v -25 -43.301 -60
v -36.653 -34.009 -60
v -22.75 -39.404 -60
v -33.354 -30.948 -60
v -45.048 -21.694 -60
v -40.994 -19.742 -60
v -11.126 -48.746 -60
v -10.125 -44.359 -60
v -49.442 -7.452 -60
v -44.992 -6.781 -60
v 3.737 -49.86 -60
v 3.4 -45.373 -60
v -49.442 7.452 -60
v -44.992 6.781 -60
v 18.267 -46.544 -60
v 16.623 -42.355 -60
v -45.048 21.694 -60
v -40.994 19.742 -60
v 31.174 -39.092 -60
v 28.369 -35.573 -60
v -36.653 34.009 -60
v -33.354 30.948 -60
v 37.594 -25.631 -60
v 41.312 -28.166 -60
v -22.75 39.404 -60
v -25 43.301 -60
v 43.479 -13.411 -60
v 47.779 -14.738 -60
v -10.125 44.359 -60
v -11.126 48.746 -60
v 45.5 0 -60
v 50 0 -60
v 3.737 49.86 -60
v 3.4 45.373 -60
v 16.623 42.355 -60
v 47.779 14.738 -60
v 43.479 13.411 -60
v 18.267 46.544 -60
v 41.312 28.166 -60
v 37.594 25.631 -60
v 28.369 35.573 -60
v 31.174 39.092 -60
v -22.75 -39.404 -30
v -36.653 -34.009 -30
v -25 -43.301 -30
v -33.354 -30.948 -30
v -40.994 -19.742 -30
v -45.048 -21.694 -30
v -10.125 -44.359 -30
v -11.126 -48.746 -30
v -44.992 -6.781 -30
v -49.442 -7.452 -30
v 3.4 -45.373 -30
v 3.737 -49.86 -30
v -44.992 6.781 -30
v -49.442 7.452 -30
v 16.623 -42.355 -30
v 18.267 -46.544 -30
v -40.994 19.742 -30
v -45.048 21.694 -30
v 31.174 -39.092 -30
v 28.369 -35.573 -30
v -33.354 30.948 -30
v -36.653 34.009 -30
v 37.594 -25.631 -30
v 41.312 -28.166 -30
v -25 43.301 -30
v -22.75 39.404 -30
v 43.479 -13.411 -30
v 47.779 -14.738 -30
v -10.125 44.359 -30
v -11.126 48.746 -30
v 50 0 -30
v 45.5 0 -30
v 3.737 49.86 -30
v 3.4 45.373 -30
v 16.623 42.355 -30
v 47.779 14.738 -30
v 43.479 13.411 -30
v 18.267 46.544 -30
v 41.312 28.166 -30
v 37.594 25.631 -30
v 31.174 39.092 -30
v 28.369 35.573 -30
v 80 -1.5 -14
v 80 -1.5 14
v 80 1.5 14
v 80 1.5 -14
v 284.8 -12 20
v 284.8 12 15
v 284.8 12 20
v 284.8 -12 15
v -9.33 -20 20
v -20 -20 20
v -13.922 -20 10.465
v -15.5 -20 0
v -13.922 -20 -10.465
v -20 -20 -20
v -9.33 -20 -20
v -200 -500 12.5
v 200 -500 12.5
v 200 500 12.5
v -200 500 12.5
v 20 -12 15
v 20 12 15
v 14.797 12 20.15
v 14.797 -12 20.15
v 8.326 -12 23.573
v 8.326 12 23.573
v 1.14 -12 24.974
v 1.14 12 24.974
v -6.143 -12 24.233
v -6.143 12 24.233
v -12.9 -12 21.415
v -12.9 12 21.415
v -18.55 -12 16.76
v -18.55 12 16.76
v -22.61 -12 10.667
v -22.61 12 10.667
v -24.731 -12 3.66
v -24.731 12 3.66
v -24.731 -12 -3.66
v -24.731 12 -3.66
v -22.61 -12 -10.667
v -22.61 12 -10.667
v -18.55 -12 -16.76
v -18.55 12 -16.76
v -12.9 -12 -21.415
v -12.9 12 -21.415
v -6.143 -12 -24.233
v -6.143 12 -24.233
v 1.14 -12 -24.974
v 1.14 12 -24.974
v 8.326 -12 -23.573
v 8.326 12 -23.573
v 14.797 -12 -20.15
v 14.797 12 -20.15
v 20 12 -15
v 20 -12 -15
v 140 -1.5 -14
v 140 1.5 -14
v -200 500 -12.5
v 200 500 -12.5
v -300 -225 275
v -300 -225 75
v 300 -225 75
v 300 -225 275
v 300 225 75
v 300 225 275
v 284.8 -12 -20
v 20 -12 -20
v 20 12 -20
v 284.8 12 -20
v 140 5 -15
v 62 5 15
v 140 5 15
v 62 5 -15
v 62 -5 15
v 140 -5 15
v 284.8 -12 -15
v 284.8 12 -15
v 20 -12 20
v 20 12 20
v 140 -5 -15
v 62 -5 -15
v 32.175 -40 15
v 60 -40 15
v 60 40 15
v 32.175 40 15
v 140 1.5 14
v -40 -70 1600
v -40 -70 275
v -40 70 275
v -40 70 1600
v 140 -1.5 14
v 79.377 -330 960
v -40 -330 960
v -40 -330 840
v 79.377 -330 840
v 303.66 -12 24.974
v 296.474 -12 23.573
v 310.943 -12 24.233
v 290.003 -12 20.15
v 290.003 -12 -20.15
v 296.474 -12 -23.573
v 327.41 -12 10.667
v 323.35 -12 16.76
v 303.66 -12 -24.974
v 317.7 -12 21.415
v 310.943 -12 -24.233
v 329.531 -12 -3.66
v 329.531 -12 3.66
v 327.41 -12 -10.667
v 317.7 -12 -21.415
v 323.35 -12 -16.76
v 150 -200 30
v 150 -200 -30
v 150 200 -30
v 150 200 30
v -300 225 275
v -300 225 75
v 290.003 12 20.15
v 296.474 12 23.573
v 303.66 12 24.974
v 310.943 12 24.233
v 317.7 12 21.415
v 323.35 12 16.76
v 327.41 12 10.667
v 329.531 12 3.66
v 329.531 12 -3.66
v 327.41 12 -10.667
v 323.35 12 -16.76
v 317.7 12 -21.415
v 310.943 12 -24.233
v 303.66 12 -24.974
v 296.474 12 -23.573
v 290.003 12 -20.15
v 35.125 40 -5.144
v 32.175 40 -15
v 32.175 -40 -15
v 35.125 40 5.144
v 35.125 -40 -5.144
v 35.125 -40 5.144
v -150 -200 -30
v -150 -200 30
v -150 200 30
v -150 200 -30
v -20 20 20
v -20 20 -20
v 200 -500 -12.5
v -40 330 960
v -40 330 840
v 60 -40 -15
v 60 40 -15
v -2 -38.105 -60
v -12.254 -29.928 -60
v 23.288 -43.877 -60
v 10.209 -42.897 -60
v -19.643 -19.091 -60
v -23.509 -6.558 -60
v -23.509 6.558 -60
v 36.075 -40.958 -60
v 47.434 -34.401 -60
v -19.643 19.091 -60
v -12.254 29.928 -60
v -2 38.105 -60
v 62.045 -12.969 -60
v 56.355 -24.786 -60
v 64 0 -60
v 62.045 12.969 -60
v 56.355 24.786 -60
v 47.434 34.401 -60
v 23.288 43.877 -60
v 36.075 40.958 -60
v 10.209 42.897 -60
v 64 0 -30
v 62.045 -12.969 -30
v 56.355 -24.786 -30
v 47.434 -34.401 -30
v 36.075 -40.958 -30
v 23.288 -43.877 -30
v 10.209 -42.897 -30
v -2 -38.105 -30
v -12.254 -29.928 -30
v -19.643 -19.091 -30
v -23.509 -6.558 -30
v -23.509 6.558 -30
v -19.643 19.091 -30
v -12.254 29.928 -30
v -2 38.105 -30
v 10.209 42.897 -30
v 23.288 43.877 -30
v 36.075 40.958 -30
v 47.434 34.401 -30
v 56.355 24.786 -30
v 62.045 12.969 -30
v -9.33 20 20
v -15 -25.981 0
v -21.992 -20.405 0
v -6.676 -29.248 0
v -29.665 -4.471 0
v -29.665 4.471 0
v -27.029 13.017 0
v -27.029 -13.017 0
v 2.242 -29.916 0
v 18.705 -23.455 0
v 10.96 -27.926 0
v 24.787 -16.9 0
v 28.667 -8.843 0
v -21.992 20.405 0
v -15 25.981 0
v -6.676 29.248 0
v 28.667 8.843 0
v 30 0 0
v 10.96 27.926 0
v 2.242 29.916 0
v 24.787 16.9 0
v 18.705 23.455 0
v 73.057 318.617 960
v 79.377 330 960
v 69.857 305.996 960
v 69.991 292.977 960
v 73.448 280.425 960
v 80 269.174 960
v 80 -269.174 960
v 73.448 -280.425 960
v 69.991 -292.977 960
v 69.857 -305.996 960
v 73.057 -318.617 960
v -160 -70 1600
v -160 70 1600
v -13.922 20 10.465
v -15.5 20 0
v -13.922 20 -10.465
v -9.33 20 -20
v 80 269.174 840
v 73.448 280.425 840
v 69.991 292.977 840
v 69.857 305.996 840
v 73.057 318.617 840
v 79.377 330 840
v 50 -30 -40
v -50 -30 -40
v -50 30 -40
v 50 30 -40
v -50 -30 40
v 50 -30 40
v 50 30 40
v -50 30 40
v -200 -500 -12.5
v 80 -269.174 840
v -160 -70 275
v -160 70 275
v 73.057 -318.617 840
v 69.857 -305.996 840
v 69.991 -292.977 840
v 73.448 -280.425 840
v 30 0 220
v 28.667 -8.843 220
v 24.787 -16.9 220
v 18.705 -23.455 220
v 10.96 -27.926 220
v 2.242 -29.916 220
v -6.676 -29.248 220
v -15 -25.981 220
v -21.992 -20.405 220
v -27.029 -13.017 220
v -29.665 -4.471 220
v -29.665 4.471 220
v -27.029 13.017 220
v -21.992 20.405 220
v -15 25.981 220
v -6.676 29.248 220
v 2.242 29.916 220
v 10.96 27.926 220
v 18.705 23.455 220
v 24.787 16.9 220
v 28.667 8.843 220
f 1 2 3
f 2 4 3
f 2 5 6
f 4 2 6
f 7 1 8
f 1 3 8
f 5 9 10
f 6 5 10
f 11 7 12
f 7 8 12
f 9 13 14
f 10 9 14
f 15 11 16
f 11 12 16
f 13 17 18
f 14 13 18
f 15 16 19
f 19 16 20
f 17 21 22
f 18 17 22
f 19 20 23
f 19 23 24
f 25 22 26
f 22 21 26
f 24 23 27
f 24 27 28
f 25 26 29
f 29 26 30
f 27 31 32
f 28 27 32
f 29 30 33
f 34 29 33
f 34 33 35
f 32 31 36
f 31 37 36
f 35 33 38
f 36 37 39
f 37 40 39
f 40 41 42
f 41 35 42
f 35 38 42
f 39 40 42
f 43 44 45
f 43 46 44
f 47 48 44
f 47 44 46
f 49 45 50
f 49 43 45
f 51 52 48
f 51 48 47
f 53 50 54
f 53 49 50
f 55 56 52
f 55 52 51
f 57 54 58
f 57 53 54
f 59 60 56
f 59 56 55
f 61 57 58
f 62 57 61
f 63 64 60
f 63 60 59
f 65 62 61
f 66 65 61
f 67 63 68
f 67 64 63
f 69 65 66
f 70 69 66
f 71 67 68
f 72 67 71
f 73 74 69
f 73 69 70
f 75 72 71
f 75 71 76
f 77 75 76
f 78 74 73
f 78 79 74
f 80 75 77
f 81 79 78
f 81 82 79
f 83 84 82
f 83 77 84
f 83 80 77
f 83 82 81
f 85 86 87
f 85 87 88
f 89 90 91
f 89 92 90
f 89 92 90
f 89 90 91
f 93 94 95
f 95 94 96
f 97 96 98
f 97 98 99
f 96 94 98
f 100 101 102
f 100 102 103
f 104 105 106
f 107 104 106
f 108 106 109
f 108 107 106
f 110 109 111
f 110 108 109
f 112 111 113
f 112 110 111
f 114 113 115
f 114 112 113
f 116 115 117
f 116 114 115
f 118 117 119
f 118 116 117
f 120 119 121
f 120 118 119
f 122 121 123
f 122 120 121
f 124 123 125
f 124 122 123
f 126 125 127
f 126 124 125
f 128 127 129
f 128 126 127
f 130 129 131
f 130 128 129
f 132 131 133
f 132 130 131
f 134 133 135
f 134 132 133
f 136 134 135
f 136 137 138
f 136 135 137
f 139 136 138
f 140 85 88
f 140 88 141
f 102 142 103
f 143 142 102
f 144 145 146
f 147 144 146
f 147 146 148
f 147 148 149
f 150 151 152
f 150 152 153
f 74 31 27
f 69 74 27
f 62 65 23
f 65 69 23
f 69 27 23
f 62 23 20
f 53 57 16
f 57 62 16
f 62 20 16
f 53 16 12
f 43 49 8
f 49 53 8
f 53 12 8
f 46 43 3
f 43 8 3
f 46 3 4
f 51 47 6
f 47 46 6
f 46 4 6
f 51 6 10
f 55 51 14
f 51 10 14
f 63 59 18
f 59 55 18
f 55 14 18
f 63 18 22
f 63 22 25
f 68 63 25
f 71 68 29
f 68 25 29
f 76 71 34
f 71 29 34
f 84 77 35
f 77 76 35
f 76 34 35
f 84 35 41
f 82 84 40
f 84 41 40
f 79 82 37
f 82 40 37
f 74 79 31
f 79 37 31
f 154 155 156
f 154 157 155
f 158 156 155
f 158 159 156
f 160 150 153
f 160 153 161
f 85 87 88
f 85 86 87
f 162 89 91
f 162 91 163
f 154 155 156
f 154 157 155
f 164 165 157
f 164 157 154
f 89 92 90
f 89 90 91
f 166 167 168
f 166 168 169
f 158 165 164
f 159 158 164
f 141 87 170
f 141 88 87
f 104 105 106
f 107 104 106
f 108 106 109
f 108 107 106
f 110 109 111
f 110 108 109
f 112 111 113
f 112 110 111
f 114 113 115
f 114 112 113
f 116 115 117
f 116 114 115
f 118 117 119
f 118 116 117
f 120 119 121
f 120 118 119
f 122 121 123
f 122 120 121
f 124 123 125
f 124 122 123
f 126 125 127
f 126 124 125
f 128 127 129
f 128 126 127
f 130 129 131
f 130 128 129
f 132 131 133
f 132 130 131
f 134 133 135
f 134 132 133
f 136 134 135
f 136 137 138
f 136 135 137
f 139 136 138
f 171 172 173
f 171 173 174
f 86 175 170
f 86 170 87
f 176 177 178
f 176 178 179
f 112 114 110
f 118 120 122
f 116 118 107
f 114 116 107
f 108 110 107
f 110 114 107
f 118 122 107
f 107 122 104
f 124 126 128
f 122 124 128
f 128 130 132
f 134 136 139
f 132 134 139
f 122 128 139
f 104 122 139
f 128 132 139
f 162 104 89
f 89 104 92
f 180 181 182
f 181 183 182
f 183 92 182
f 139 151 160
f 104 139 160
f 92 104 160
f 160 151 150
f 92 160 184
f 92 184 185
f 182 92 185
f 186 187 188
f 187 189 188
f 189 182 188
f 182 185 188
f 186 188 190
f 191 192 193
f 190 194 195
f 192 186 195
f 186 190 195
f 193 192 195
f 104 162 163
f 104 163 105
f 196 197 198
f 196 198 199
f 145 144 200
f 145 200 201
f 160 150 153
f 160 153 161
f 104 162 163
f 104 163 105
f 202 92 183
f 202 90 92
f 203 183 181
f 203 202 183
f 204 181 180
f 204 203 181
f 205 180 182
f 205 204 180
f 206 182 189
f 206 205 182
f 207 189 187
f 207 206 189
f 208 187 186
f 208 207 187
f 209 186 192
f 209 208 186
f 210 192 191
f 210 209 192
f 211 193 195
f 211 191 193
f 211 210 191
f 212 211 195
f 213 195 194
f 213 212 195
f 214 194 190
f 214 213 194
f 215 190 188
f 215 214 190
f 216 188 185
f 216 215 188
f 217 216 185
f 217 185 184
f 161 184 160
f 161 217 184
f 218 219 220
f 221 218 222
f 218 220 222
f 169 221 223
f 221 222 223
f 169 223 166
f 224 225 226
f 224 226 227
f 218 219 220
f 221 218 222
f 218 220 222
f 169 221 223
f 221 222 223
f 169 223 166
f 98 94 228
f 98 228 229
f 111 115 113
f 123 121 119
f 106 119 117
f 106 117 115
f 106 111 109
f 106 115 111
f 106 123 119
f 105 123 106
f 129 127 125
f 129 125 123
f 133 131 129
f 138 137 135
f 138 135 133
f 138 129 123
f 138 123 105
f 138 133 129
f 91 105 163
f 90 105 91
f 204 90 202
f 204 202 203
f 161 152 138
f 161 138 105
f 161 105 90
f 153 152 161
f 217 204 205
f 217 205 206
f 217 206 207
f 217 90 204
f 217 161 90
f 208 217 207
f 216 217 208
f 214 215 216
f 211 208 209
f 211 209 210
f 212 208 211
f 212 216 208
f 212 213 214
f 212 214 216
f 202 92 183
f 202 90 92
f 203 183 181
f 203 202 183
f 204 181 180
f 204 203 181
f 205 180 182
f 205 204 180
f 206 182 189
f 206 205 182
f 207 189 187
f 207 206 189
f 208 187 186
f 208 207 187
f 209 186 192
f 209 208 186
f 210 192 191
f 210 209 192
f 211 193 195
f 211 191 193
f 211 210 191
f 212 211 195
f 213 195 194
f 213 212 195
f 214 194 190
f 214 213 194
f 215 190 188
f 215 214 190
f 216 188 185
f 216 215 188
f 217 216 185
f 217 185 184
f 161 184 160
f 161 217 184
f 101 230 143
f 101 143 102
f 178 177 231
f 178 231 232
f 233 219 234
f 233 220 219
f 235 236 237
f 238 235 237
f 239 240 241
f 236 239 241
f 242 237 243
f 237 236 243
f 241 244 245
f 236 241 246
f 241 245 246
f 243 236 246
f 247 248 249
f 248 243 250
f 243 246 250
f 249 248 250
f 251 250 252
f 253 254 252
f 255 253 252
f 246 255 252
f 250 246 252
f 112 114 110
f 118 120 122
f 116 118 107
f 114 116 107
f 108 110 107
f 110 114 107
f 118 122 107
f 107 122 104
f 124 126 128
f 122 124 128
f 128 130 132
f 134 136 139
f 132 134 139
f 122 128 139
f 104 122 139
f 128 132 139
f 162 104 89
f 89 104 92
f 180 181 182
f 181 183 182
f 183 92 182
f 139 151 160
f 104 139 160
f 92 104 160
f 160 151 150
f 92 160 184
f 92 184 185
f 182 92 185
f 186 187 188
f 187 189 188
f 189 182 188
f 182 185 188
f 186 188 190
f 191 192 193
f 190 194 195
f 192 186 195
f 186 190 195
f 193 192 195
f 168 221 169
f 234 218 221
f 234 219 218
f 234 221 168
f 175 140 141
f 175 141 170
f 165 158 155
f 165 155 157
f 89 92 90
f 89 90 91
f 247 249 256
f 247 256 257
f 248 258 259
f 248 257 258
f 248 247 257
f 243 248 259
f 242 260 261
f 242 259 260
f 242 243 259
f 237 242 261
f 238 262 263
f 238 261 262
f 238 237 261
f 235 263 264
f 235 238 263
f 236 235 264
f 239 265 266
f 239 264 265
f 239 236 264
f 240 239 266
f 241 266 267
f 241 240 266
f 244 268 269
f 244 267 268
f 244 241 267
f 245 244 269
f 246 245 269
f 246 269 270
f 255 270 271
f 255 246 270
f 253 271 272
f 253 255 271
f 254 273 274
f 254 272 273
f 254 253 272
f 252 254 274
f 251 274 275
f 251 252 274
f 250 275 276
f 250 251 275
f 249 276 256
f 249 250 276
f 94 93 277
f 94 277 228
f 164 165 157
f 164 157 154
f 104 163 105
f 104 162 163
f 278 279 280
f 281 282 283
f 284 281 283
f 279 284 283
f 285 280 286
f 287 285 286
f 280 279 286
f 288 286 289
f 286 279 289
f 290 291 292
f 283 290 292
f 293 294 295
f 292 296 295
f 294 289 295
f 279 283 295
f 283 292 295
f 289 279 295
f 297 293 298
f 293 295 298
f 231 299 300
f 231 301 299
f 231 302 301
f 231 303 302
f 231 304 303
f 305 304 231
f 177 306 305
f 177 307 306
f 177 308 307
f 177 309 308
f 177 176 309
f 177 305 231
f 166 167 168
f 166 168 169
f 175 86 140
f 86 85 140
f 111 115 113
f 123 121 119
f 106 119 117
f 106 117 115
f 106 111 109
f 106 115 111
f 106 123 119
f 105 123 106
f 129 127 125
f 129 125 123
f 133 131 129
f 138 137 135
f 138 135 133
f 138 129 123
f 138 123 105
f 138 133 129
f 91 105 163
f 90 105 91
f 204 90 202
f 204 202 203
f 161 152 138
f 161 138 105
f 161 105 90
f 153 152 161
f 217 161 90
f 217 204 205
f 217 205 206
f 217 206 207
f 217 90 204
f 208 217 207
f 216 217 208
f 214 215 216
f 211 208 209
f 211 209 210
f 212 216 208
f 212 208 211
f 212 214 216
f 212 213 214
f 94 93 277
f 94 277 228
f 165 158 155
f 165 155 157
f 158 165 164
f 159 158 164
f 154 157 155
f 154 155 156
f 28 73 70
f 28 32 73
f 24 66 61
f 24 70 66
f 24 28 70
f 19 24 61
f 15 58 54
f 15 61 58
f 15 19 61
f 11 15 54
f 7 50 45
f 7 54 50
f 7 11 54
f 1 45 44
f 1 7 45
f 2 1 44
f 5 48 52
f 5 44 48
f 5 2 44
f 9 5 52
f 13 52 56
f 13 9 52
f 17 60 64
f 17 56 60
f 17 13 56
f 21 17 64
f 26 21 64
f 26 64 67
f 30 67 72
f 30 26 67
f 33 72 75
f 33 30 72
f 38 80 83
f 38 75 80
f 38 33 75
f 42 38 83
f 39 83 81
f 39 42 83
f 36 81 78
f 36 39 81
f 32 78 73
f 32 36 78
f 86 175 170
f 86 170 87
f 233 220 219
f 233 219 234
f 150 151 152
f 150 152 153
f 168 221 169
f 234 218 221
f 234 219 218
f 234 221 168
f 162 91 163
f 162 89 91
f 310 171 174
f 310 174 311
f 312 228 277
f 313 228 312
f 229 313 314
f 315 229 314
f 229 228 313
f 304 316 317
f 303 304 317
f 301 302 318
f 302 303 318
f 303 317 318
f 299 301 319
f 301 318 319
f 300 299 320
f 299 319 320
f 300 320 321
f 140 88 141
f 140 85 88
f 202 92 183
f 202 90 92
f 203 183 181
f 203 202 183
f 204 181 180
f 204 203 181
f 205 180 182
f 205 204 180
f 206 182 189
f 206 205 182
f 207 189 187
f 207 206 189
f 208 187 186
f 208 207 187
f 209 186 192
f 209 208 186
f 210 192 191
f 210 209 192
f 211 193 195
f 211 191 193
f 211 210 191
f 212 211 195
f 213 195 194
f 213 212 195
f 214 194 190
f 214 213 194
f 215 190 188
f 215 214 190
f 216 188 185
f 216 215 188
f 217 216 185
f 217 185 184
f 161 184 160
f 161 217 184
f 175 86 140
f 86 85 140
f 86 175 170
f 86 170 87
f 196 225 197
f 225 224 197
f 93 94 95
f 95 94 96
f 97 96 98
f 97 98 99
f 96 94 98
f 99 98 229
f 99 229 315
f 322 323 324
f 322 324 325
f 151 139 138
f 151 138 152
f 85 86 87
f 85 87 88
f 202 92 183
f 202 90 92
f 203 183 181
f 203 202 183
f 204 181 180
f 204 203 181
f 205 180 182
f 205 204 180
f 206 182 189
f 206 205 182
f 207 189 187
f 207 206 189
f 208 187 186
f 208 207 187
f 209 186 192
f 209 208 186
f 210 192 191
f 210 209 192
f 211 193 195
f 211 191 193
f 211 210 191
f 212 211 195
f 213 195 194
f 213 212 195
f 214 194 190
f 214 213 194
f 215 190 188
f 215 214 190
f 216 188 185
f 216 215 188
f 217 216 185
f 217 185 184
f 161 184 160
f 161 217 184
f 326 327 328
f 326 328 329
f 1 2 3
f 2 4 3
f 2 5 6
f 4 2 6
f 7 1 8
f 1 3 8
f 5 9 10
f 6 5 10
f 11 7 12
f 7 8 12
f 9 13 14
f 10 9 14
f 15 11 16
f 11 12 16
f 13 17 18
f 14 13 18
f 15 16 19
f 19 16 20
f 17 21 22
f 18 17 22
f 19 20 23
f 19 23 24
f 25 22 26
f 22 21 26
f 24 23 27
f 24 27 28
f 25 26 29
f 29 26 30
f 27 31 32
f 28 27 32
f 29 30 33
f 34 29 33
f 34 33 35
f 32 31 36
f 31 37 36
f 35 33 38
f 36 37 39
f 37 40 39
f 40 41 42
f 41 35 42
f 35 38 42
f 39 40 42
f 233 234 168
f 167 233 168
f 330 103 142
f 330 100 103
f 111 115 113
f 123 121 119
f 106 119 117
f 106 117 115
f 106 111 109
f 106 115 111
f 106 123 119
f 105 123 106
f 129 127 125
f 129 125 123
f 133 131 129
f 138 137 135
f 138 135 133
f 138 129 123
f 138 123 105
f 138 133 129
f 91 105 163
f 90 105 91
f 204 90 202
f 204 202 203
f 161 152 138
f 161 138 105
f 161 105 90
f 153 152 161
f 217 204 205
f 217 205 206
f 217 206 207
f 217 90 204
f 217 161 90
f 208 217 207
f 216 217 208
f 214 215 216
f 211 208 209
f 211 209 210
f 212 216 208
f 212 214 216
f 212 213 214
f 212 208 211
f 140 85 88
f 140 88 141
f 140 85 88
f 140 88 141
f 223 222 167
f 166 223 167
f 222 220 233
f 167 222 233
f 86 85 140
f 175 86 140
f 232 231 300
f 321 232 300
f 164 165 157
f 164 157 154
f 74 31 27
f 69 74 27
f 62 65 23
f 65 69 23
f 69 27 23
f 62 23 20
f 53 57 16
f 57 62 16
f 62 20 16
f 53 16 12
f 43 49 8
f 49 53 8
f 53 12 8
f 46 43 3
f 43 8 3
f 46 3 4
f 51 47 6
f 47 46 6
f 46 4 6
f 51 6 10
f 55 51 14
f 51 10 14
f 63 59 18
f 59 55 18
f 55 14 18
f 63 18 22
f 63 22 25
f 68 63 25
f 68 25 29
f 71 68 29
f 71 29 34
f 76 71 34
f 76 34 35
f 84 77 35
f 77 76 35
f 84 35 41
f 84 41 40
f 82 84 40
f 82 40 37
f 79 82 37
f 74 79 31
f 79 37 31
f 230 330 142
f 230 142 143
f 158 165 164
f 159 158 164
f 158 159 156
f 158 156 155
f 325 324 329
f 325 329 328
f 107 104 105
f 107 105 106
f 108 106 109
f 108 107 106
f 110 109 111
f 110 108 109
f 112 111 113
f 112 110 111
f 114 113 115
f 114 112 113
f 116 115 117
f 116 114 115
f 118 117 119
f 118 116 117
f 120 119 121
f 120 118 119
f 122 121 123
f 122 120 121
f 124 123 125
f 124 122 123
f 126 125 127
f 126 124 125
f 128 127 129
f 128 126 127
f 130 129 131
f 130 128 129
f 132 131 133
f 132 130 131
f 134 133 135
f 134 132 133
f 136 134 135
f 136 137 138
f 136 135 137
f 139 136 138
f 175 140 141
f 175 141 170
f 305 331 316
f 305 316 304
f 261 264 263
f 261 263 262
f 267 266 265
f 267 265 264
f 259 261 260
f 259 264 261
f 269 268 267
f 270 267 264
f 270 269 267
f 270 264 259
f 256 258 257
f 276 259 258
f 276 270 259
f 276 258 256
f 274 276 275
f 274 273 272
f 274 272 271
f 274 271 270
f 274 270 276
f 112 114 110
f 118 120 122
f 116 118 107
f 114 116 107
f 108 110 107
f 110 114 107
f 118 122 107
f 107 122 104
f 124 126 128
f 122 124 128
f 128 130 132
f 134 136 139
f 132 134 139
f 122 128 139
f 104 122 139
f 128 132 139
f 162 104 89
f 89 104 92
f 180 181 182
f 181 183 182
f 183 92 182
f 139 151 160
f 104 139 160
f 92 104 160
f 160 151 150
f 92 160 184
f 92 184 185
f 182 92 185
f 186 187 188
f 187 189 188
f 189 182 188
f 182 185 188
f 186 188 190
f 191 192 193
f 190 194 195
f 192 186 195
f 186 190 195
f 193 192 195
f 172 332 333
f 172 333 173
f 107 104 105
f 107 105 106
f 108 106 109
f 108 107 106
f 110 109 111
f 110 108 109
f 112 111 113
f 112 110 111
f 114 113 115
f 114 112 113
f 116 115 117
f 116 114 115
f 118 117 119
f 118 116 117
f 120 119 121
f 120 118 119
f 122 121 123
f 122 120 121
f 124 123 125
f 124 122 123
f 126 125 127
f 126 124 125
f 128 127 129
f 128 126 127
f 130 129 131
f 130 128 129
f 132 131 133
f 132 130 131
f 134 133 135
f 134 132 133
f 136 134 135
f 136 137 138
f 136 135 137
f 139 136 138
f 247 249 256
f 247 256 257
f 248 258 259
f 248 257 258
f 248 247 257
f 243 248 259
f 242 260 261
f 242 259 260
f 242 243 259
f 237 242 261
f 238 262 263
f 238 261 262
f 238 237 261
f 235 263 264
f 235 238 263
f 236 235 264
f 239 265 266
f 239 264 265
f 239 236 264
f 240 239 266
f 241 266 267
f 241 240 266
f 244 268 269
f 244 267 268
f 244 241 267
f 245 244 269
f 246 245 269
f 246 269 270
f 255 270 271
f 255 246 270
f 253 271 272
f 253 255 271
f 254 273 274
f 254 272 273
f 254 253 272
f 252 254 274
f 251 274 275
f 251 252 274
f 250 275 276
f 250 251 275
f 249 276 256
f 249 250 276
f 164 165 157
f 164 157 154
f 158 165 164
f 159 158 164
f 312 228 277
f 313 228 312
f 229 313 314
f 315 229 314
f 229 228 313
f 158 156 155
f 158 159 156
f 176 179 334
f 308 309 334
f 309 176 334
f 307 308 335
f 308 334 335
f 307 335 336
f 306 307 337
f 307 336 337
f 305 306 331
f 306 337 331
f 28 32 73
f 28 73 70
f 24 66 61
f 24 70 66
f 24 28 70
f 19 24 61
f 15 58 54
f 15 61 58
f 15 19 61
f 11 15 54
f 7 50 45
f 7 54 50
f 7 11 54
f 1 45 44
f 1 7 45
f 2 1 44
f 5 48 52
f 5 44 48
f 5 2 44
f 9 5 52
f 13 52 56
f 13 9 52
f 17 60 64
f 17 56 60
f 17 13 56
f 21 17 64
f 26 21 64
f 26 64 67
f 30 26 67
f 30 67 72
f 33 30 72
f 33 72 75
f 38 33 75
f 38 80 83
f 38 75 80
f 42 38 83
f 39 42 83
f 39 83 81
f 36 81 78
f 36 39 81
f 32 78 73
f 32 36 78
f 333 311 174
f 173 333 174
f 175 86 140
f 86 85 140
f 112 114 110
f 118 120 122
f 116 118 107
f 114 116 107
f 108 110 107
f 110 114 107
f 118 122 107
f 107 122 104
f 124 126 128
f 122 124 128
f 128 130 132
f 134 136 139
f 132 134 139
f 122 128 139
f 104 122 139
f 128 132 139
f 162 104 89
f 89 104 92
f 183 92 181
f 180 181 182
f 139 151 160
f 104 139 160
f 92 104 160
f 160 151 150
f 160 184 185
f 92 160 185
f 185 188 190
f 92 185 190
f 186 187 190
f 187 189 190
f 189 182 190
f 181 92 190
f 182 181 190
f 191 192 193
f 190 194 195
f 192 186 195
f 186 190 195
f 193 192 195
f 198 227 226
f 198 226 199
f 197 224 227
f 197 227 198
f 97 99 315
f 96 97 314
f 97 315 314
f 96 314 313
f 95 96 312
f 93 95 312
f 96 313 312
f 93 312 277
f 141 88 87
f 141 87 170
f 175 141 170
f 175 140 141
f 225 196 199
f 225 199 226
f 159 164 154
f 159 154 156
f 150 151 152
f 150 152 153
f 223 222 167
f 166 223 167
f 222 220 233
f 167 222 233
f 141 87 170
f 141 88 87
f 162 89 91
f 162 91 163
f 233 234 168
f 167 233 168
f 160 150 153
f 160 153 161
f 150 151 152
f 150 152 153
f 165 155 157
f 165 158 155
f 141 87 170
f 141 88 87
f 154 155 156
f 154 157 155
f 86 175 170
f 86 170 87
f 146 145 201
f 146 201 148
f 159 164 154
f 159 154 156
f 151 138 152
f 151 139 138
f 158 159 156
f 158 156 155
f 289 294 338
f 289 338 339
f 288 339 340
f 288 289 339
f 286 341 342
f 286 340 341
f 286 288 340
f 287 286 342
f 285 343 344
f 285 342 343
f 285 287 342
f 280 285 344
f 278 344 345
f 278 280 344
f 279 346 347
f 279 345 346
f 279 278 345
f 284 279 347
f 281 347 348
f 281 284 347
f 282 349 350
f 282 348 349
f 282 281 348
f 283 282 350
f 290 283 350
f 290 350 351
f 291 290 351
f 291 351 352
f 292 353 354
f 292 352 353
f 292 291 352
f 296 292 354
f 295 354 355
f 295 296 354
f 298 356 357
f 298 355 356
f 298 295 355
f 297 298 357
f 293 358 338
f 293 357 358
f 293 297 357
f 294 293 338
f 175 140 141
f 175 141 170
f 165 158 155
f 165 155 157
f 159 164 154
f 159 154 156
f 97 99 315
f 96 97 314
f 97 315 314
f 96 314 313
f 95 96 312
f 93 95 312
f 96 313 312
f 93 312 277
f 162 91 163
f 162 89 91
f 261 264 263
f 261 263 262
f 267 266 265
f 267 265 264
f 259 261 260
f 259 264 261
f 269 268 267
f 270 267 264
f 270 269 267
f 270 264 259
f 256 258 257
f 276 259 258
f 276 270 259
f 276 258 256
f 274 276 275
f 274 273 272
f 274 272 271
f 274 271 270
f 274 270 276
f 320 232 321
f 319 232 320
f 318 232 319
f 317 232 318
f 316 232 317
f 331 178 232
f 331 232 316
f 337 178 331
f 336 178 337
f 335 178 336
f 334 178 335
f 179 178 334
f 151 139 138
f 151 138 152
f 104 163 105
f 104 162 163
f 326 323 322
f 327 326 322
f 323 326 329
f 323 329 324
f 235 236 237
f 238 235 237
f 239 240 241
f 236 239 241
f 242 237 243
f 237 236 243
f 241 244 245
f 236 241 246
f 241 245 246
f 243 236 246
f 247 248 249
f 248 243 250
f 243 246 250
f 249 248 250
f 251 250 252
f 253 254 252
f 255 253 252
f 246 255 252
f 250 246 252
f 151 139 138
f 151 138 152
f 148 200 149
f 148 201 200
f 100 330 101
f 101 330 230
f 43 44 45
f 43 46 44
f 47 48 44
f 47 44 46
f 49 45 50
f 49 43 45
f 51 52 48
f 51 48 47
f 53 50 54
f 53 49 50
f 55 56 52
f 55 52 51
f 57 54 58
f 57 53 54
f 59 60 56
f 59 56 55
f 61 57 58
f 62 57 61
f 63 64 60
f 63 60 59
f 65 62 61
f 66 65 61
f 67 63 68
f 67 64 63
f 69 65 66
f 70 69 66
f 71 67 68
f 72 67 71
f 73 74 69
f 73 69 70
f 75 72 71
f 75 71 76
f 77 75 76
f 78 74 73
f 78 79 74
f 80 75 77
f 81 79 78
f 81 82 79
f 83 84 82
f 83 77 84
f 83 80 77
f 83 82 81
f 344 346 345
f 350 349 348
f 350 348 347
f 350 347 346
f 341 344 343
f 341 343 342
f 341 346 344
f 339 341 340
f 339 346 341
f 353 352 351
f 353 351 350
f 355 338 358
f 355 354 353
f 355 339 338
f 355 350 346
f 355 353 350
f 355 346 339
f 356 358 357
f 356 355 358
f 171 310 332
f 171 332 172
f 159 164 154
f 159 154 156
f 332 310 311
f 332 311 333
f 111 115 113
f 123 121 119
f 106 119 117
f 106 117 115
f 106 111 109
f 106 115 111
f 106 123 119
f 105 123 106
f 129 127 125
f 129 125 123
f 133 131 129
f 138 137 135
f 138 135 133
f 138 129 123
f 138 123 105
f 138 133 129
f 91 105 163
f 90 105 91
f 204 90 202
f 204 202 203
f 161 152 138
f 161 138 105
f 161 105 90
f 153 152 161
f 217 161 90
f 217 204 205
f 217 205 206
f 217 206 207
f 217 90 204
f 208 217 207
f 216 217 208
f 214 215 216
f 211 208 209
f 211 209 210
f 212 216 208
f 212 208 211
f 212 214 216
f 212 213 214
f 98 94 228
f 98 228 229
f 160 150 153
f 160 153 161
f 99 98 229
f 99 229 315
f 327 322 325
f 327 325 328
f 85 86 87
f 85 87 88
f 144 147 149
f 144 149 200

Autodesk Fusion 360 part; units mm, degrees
sketch "Layout_Side" plane through (0, 0, 0) normal (0, 1, 0) x (1, 0, 0) in component "00_Layout"
  line L0 (0, 0) -> (0, -1676.4) construction
  line L1 (300, -275) -> (-300, -275) construction
  line L2 (-300, -275) -> (-300, -75) construction
  line L3 (-300, -75) -> (300, -75) construction
  line L4 (300, -75) -> (300, -275) construction
  line L5 (300, -275) -> (-300, -75) construction
  line L6 (-300, -275) -> (300, -75) construction
  line L7 (0, -1676.4) -> (600, -1676.4) construction
  line L8 (0, -175) -> (0, -75) construction
  dimension "d1" = 200
  dimension "d2" = 600
  dimension "d4" = 600
  dimension "d5" = 75
  dimension "d6" = 1676.4
sketch "Base_Profile" plane through (0, 0, 0) normal (0, 1, 0) x (1, 0, 0) in component "01_Base_Envelope"
  line L0 (300, -275) -> (-300, -275)
  line L1 (-300, -275) -> (-300, -75)
  line L2 (-300, -75) -> (300, -75)
  line L3 (300, -75) -> (300, -275)
extrude "Chassis_Width_450mm" add sketch "Base_Profile" along normal mid plane 450 makes body 1 in component "01_Base_Envelope"
sketch "Mast_Envelope_Side_Profile" plane through (0, 0, 0) normal (0, 1, 0) x (1, 0, 0) in component "02_Mast_Envelope"
  line L0 (-160, -275) -> (-40, -275)
  line L1 (-40, -275) -> (-40, -1600)
  line L2 (-40, -1600) -> (-160, -1600)
  line L3 (-160, -1600) -> (-160, -275)
  line L4 (300, -275) -> (-300, -275) construction
  dimension "d9" = 120
  dimension "d10" = 1325
  dimension "d11" = 160
extrude "Mast_Envelope_Width_140mm" add sketch "Mast_Envelope_Side_Profile" along normal mid plane 140 separate body makes body 2 in component "02_Mast_Envelope"
sketch "Shared_Carriage_Side_Profile" plane through (0, 0, 0) normal (0, 1, 0) x (1, 0, 0) in component "03_Shared_Carriage"
  line L0 (-40, -840) -> (80, -840)
  line L1 (80, -840) -> (80, -960)
  line L2 (80, -960) -> (-40, -960)
  line L3 (-40, -960) -> (-40, -840)
  dimension "d14" = 120
  dimension "d15" = 120
  dimension "d16" = 40
  dimension "d17" = 840
extrude "Shared_Carriage_Width_660mm" add sketch "Shared_Carriage_Side_Profile" along normal mid plane 660 separate body makes body 3 in component "03_Shared_Carriage"
ref_plane "WorkPlane1" through (0, 300, 0) normal (0, 1, 0) x (0, 0, 1) in component "00_Layout"
sketch "Reach_Left_Floor_2x304p8mm" plane through (0, 300, 0) normal (0, 1, 0) x (1, 0, 0) in component "00_Layout"
  circle A0 centre (80, -400) radius 609.6 construction
  line L0 (80, -400) -> (380.0994, -346.6765) construction
  line L1 (380.0994, -346.6765) -> (450, -50) construction
  dimension "d25" = 80
  dimension "d26" = 400
  dimension "d27" = 450
  dimension "d28" = 50
  dimension "d29" = 609.6
  dimension "d30" = 304.8
  dimension "d31" = 304.8
sketch "Reach_Left_Shelf_2x304p8mm" plane through (0, 300, 0) normal (0, 1, 0) x (1, 0, 0) in component "00_Layout"
  circle A0 centre (80, -1400) radius 609.6 construction
  line L0 (80, -1400) -> (198.6357, -1680.7643) construction
  line L1 (198.6357, -1680.7643) -> (500, -1726.4) construction
  dimension "d32" = 80
  dimension "d33" = 1400
  dimension "d34" = 500
  dimension "d35" = 1726.4
  dimension "d36" = 609.6
  dimension "d37" = 304.8
  dimension "d38" = 304.8
ref_plane "WorkPlane2" through (0, -300, 0) normal (0, 1, 0) x (0, 0, 1) in component "00_Layout"
sketch "Reach_Right_Floor_2x304p8mm" plane through (0, -300, 0) normal (0, 1, 0) x (1, 0, 0) in component "00_Layout"
  circle A0 centre (80, -400) radius 609.6 construction
  line L0 (80, -400) -> (380.0994, -346.6765) construction
  line L1 (380.0994, -346.6765) -> (450, -50) construction
  dimension "d41" = 80
  dimension "d42" = 400
  dimension "d43" = 450
  dimension "d44" = 50
  dimension "d45" = 609.6
  dimension "d46" = 304.8
  dimension "d47" = 304.8
sketch "Reach_Right_Shelf_2x304p8mm" plane through (0, -300, 0) normal (0, 1, 0) x (1, 0, 0) in component "00_Layout"
  circle A0 centre (80, -1400) radius 609.6 construction
  line L0 (80, -1400) -> (198.6357, -1680.7643) construction
  line L1 (198.6357, -1680.7643) -> (500, -1726.4) construction
  dimension "d48" = 80
  dimension "d49" = 1400
  dimension "d50" = 500
  dimension "d51" = 1726.4
  dimension "d52" = 609.6
  dimension "d53" = 304.8
  dimension "d54" = 304.8
sketch "Shoulder_Mount_Profile" plane through (0, 0, 0) normal (0, 1, 0) x (1, 0, 0) in component "04_Left_Shoulder_Standoff"
  line L0 (-20, 20) -> (20, 20)
  line L1 (20, 20) -> (20, -20)
  line L2 (20, -20) -> (-20, -20)
  line L3 (-20, -20) -> (-20, 20)
  dimension "d55" = 20
  dimension "d56" = 20
  dimension "d57" = 40
  dimension "d58" = 40
extrude "Shoulder_Mount" add sketch "Shoulder_Mount_Profile" along normal mid plane 40 separate body makes body 4 in component "04_Left_Shoulder_Standoff"
sketch "Upper_Link_304p8mm_Profile" plane through (0, 0, 0) normal (0, 1, 0) x (1, 0, 0) in component "05_Left_Upper_Arm"
  line L0 (20, 20) -> (284.8, 20)
  line L1 (284.8, 20) -> (284.8, -20)
  line L2 (284.8, -20) -> (20, -20)
  line L3 (20, -20) -> (20, 20)
  dimension "d61" = 20
  dimension "d62" = 20
  dimension "d63" = 264.8
  dimension "d64" = 40
extrude "Upper_Link_304p8mm" add sketch "Upper_Link_304p8mm_Profile" along normal mid plane 24 separate body makes body 5 in component "05_Left_Upper_Arm"
sketch "Joint_Axis_Locations" plane through (0, 0, 0) normal (0, 1, 0) x (1, 0, 0) in component "05_Left_Upper_Arm"
  line L0 (0, 0) -> (304.8, 0) construction
  dimension "d67" = 304.8
sketch "Fore_Link_304p8mm_Profile" plane through (0, 0, 0) normal (0, 1, 0) x (1, 0, 0) in component "06_Left_Forearm"
  line L0 (20, 20) -> (284.8, 20)
  line L1 (284.8, 20) -> (284.8, -20)
  line L2 (284.8, -20) -> (20, -20)
  line L3 (20, -20) -> (20, 20)
  dimension "d68" = 20
  dimension "d69" = 20
  dimension "d70" = 264.8
  dimension "d71" = 40
extrude "Fore_Link_304p8mm" add sketch "Fore_Link_304p8mm_Profile" along normal mid plane 24 separate body makes body 6 in component "06_Left_Forearm"
sketch "Joint_Axis_Locations (2)" plane through (0, 0, 0) normal (0, 1, 0) x (1, 0, 0) in component "06_Left_Forearm"
  line L0 (0, 0) -> (304.8, 0) construction
  dimension "d74" = 304.8
sketch "Palm_Envelope_Profile" plane through (0, 0, 0) normal (0, 1, 0) x (1, 0, 0) in component "07_Left_Wrist_Palm"
  line L0 (5, 15) -> (60, 15)
  line L1 (60, 15) -> (60, -15)
  line L2 (60, -15) -> (5, -15)
  line L3 (5, -15) -> (5, 15)
  dimension "d75" = 5
  dimension "d76" = 15
  dimension "d77" = 55
  dimension "d78" = 30
extrude "Palm_Envelope" add sketch "Palm_Envelope_Profile" along normal mid plane 80 separate body makes body 7 in component "07_Left_Wrist_Palm"
sketch "Joint_Axis_Locations (3)" plane through (0, 0, 0) normal (0, 1, 0) x (1, 0, 0) in component "07_Left_Wrist_Palm"
  line L0 (0, 0) -> (110, 0) construction
  dimension "d81" = 110
sketch "Finger_Envelope_Profile" plane through (0, 0, 0) normal (0, 1, 0) x (1, 0, 0) in component "08_Left_Finger_Positive"
  line L0 (62, 15) -> (140, 15)
  line L1 (140, 15) -> (140, -15)
  line L2 (140, -15) -> (62, -15)
  line L3 (62, -15) -> (62, 15)
  dimension "d88" = 62
  dimension "d89" = 15
  dimension "d90" = 78
  dimension "d91" = 30
extrude "Finger_Envelope" add sketch "Finger_Envelope_Profile" along normal mid plane 10 separate body makes body 8 in component "08_Left_Finger_Positive"
sketch "Soft_Pad_Envelope_Profile" plane through (0, 0, 0) normal (0, 1, 0) x (1, 0, 0) in component "09_Left_Pad_Positive"
  line L0 (80, 14) -> (140, 14)
  line L1 (140, 14) -> (140, -14)
  line L2 (140, -14) -> (80, -14)
  line L3 (80, -14) -> (80, 14)
  dimension "d94" = 80
  dimension "d95" = 14
  dimension "d96" = 60
  dimension "d97" = 28
extrude "Soft_Pad_Envelope" add sketch "Soft_Pad_Envelope_Profile" along normal mid plane 3 separate body makes body 9 in component "09_Left_Pad_Positive"
sketch "Finger_Envelope_Profile (2)" plane through (0, 0, 0) normal (0, 1, 0) x (1, 0, 0) in component "08_Left_Finger_Negative"
  line L0 (62, 15) -> (140, 15)
  line L1 (140, 15) -> (140, -15)
  line L2 (140, -15) -> (62, -15)
  line L3 (62, -15) -> (62, 15)
  dimension "d102" = 62
  dimension "d103" = 15
  dimension "d104" = 78
  dimension "d105" = 30
extrude "Finger_Envelope'" add sketch "Finger_Envelope_Profile (2)" along normal mid plane 10 separate body makes body 10 in component "08_Left_Finger_Negative"
sketch "Soft_Pad_Envelope_Profile (2)" plane through (0, 0, 0) normal (0, 1, 0) x (1, 0, 0) in component "09_Left_Pad_Negative"
  line L0 (80, 14) -> (140, 14)
  line L1 (140, 14) -> (140, -14)
  line L2 (140, -14) -> (80, -14)
  line L3 (80, -14) -> (80, 14)
  dimension "d108" = 80
  dimension "d109" = 14
  dimension "d110" = 60
  dimension "d111" = 28
extrude "Soft_Pad_Envelope'" add sketch "Soft_Pad_Envelope_Profile (2)" along normal mid plane 3 separate body makes body 11 in component "09_Left_Pad_Negative"
sketch "Shoulder_Mount_Profile (2)" plane through (0, 0, 0) normal (0, 1, 0) x (1, 0, 0) in component "04_Right_Shoulder_Standoff"
  line L0 (-20, 20) -> (20, 20)
  line L1 (20, 20) -> (20, -20)
  line L2 (20, -20) -> (-20, -20)
  line L3 (-20, -20) -> (-20, 20)
  dimension "d116" = 20
  dimension "d117" = 20
  dimension "d118" = 40
  dimension "d119" = 40
extrude "Shoulder_Mount'" add sketch "Shoulder_Mount_Profile (2)" along normal mid plane 40 separate body makes body 12 in component "04_Right_Shoulder_Standoff"
sketch "Upper_Link_304p8mm_Profile (2)" plane through (0, 0, 0) normal (0, 1, 0) x (1, 0, 0) in component "05_Right_Upper_Arm"
  line L0 (20, 20) -> (284.8, 20)
  line L1 (284.8, 20) -> (284.8, -20)
  line L2 (284.8, -20) -> (20, -20)
  line L3 (20, -20) -> (20, 20)
  dimension "d122" = 20
  dimension "d123" = 20
  dimension "d124" = 264.8
  dimension "d125" = 40
extrude "Upper_Link_304p8mm'" add sketch "Upper_Link_304p8mm_Profile (2)" along normal mid plane 24 separate body makes body 13 in component "05_Right_Upper_Arm"
sketch "Joint_Axis_Locations (4)" plane through (0, 0, 0) normal (0, 1, 0) x (1, 0, 0) in component "05_Right_Upper_Arm"
  line L0 (0, 0) -> (304.8, 0) construction
  dimension "d128" = 304.8
sketch "Fore_Link_304p8mm_Profile (2)" plane through (0, 0, 0) normal (0, 1, 0) x (1, 0, 0) in component "06_Right_Forearm"
  line L0 (20, 20) -> (284.8, 20)
  line L1 (284.8, 20) -> (284.8, -20)
  line L2 (284.8, -20) -> (20, -20)
  line L3 (20, -20) -> (20, 20)
  dimension "d129" = 20
  dimension "d130" = 20
  dimension "d131" = 264.8
  dimension "d132" = 40
extrude "Fore_Link_304p8mm'" add sketch "Fore_Link_304p8mm_Profile (2)" along normal mid plane 24 separate body makes body 14 in component "06_Right_Forearm"
sketch "Joint_Axis_Locations (5)" plane through (0, 0, 0) normal (0, 1, 0) x (1, 0, 0) in component "06_Right_Forearm"
  line L0 (0, 0) -> (304.8, 0) construction
  dimension "d135" = 304.8
sketch "Palm_Envelope_Profile (2)" plane through (0, 0, 0) normal (0, 1, 0) x (1, 0, 0) in component "07_Right_Wrist_Palm"
  line L0 (5, 15) -> (60, 15)
  line L1 (60, 15) -> (60, -15)
  line L2 (60, -15) -> (5, -15)
  line L3 (5, -15) -> (5, 15)
  dimension "d136" = 5
  dimension "d137" = 15
  dimension "d138" = 55
  dimension "d139" = 30
extrude "Palm_Envelope'" add sketch "Palm_Envelope_Profile (2)" along normal mid plane 80 separate body makes body 15 in component "07_Right_Wrist_Palm"
sketch "Joint_Axis_Locations (6)" plane through (0, 0, 0) normal (0, 1, 0) x (1, 0, 0) in component "07_Right_Wrist_Palm"
  line L0 (0, 0) -> (110, 0) construction
  dimension "d142" = 110
sketch "Finger_Envelope_Profile (3)" plane through (0, 0, 0) normal (0, 1, 0) x (1, 0, 0) in component "08_Right_Finger_Positive"
  line L0 (62, 15) -> (140, 15)
  line L1 (140, 15) -> (140, -15)
  line L2 (140, -15) -> (62, -15)
  line L3 (62, -15) -> (62, 15)
  dimension "d149" = 62
  dimension "d150" = 15
  dimension "d151" = 78
  dimension "d152" = 30
extrude "Finger_Envelope''" add sketch "Finger_Envelope_Profile (3)" along normal mid plane 10 separate body makes body 16 in component "08_Right_Finger_Positive"
sketch "Soft_Pad_Envelope_Profile (3)" plane through (0, 0, 0) normal (0, 1, 0) x (1, 0, 0) in component "09_Right_Pad_Positive"
  line L0 (80, 14) -> (140, 14)
  line L1 (140, 14) -> (140, -14)
  line L2 (140, -14) -> (80, -14)
  line L3 (80, -14) -> (80, 14)
  dimension "d155" = 80
  dimension "d156" = 14
  dimension "d157" = 60
  dimension "d158" = 28
extrude "Soft_Pad_Envelope''" add sketch "Soft_Pad_Envelope_Profile (3)" along normal mid plane 3 separate body makes body 17 in component "09_Right_Pad_Positive"
sketch "Finger_Envelope_Profile (4)" plane through (0, 0, 0) normal (0, 1, 0) x (1, 0, 0) in component "08_Right_Finger_Negative"
  line L0 (62, 15) -> (140, 15)
  line L1 (140, 15) -> (140, -15)
  line L2 (140, -15) -> (62, -15)
  line L3 (62, -15) -> (62, 15)
  dimension "d163" = 62
  dimension "d164" = 15
  dimension "d165" = 78
  dimension "d166" = 30
extrude "Finger_Envelope'''" add sketch "Finger_Envelope_Profile (4)" along normal mid plane 10 separate body makes body 18 in component "08_Right_Finger_Negative"
sketch "Soft_Pad_Envelope_Profile (4)" plane through (0, 0, 0) normal (0, 1, 0) x (1, 0, 0) in component "09_Right_Pad_Negative"
  line L0 (80, 14) -> (140, 14)
  line L1 (140, 14) -> (140, -14)
  line L2 (140, -14) -> (80, -14)
  line L3 (80, -14) -> (80, 14)
  dimension "d169" = 80
  dimension "d170" = 14
  dimension "d171" = 60
  dimension "d172" = 28
extrude "Soft_Pad_Envelope'''" add sketch "Soft_Pad_Envelope_Profile (4)" along normal mid plane 3 separate body makes body 19 in component "09_Right_Pad_Negative"
sketch "Pivot_Housing_Envelopes" plane through (0, 0, 0) normal (0, 1, 0) x (1, 0, 0) in component "05_Left_Upper_Arm"
  circle A0 centre (0, 0) radius 25
  line L0 (0, 0) -> (304.8, 0) construction
  circle A1 centre (304.8, 0) radius 25
  dimension "d177" = 25
  dimension "d178" = 304.8
  dimension "d179" = 25
extrude "Pivot_Housing_Envelopes_24mm" add sketch "Pivot_Housing_Envelopes" along normal mid plane 24 bodies 5 in component "05_Left_Upper_Arm"
sketch "Pivot_Housing_Envelopes (2)" plane through (0, 0, 0) normal (0, 1, 0) x (1, 0, 0) in component "06_Left_Forearm"
  circle A0 centre (0, 0) radius 25
  line L0 (0, 0) -> (304.8, 0) construction
  circle A1 centre (304.8, 0) radius 25
  dimension "d182" = 25
  dimension "d183" = 304.8
  dimension "d184" = 25
extrude "Pivot_Housing_Envelopes_24mm'" add sketch "Pivot_Housing_Envelopes (2)" along normal mid plane 24 bodies 6 in component "06_Left_Forearm"
sketch "Pivot_Housing_Envelopes (3)" plane through (0, 0, 0) normal (0, 1, 0) x (1, 0, 0) in component "05_Right_Upper_Arm"
  circle A0 centre (0, 0) radius 25
  line L0 (0, 0) -> (304.8, 0) construction
  circle A1 centre (304.8, 0) radius 25
  dimension "d187" = 25
  dimension "d188" = 304.8
  dimension "d189" = 25
extrude "Pivot_Housing_Envelopes_24mm''" add sketch "Pivot_Housing_Envelopes (3)" along normal mid plane 24 bodies 13 in component "05_Right_Upper_Arm"
sketch "Pivot_Housing_Envelopes (4)" plane through (0, 0, 0) normal (0, 1, 0) x (1, 0, 0) in component "06_Right_Forearm"
  circle A0 centre (0, 0) radius 25
  line L0 (0, 0) -> (304.8, 0) construction
  circle A1 centre (304.8, 0) radius 25
  dimension "d192" = 25
  dimension "d193" = 304.8
  dimension "d194" = 25
extrude "Pivot_Housing_Envelopes_24mm'''" add sketch "Pivot_Housing_Envelopes (4)" along normal mid plane 24 bodies 14 in component "06_Right_Forearm"
sketch "Shoulder_Pitch_Sweep_Clearance_35p5mm" plane through (0, 0, 0) normal (0, 1, 0) x (1, 0, 0) in component "04_Left_Shoulder_Standoff"
  line L0 (0, 0) -> (20, 0) construction
  circle A0 centre (20, 0) radius 35.5
  dimension "d197" = 20
  dimension "d198" = 35.5
sketch "Wrist_Sweep_Clearance_35p5mm" plane through (0, 0, 0) normal (0, 1, 0) x (1, 0, 0) in component "07_Left_Wrist_Palm"
  circle A0 centre (0, 0) radius 35.5
  dimension "d203" = 35.5
sketch "Shoulder_Pitch_Sweep_Clearance_35p5mm (2)" plane through (0, 0, 0) normal (0, 1, 0) x (1, 0, 0) in component "04_Right_Shoulder_Standoff"
  line L0 (0, 0) -> (20, 0) construction
  circle A0 centre (20, 0) radius 35.5
  dimension "d208" = 20
  dimension "d209" = 35.5
sketch "Wrist_Sweep_Clearance_35p5mm (2)" plane through (0, 0, 0) normal (0, 1, 0) x (1, 0, 0) in component "07_Right_Wrist_Palm"
  circle A0 centre (0, 0) radius 35.5
  dimension "d214" = 35.5
extrude "Pivot_Clearance_Cut_This_Component_Only" cut sketch "Shoulder_Pitch_Sweep_Clearance_35p5mm" along normal mid plane 90 bodies 4 in component "04_Left_Shoulder_Standoff"
extrude "Pivot_Clearance_Cut_This_Component_Only'" cut sketch "Wrist_Sweep_Clearance_35p5mm" along normal mid plane 90 bodies 7 in component "07_Left_Wrist_Palm"
extrude "Pivot_Clearance_Cut_This_Component_Only''" cut sketch "Shoulder_Pitch_Sweep_Clearance_35p5mm (2)" along normal mid plane 90 bodies 12 in component "04_Right_Shoulder_Standoff"
extrude "Pivot_Clearance_Cut_This_Component_Only'''" cut sketch "Wrist_Sweep_Clearance_35p5mm (2)" along normal mid plane 90 bodies 15 in component "07_Right_Wrist_Palm"
sketch "Yaw_Axis_XY_Location" plane through (0, 0, 0) normal (0, 0, 1) x (1, 0, 0) in component "04_Left_Shoulder_Standoff"
  line L0 (0, 0) -> (20, 0) construction
  dimension "d262" = 20
sketch "Yaw_Axis_XY_Location (2)" plane through (0, 0, 0) normal (0, 0, 1) x (1, 0, 0) in component "04_Right_Shoulder_Standoff"
  line L0 (0, 0) -> (20, 0) construction
  dimension "d265" = 20
ref_plane "WorkPlane1" through (0, 0, 840) normal (0, 0, 1) x (1, 0, 0) in component "03_Shared_Carriage"
sketch "Shoulder_Yaw_Sweep_Relief_30" plane through (0, 0, 840) normal (0, 0, 1) x (1, 0, 0) in component "03_Shared_Carriage"
  line L0 (0, 0) -> (120, 300) construction
  circle A0 centre (120, 300) radius 50.5
  dimension "d270" = 120
  dimension "d271" = 300
  dimension "d272" = 50.5
extrude "Yaw_Sweep_Clearance_Carriage_Only" cut sketch "Shoulder_Yaw_Sweep_Relief_30" along normal blind 120 bodies 3 in component "03_Shared_Carriage"
ref_plane "WorkPlane2" through (0, 0, 840) normal (0, 0, 1) x (1, 0, 0) in component "03_Shared_Carriage"
sketch "Shoulder_Yaw_Sweep_Relief_-30" plane through (0, 0, 840) normal (0, 0, 1) x (1, 0, 0) in component "03_Shared_Carriage"
  line L0 (0, 0) -> (120, -300) construction
  circle A0 centre (120, -300) radius 50.5
  dimension "d277" = 120
  dimension "d278" = 300
  dimension "d279" = 50.5
extrude "Yaw_Sweep_Clearance_Carriage_Only (1)" cut sketch "Shoulder_Yaw_Sweep_Relief_-30" along normal blind 120 bodies 3 in component "03_Shared_Carriage"
ref_plane "WorkPlane1" through (0, 0, -60) normal (0, 0, 1) x (1, 0, 0) in component "04_Left_Shoulder_Standoff"
sketch "Yaw_Rotor_88mm_Envelope" plane through (0, 0, -60) normal (0, 0, 1) x (1, 0, 0) in component "04_Left_Shoulder_Standoff"
  line L0 (0, 0) -> (20, 0) construction
  circle A0 centre (20, 0) radius 44
  dimension "d284" = 20
  dimension "d285" = 44
extrude "Left_Yaw_Rotor_Packaging" add sketch "Yaw_Rotor_88mm_Envelope" along normal blind 30 separate body makes body 20 in component "04_Left_Shoulder_Standoff"
ref_plane "WorkPlane1" through (0, 0, -60) normal (0, 0, 1) x (1, 0, 0) in component "04_Left_Yaw_Bearing_Housing"
sketch "Bearing_Housing_100mm_Envelope" plane through (0, 0, -60) normal (0, 0, 1) x (1, 0, 0) in component "04_Left_Yaw_Bearing_Housing"
  circle A0 centre (0, 0) radius 45.5
  circle A1 centre (0, 0) radius 50
  dimension "d290" = 45.5
  dimension "d291" = 50
extrude "Left_Yaw_Bearing_Housing_Packaging" add sketch "Bearing_Housing_100mm_Envelope" along normal blind 30 separate body makes body 21 in component "04_Left_Yaw_Bearing_Housing"
ref_plane "WorkPlane1" through (0, 0, -60) normal (0, 0, 1) x (1, 0, 0) in component "04_Right_Shoulder_Standoff"
sketch "Yaw_Rotor_88mm_Envelope (2)" plane through (0, 0, -60) normal (0, 0, 1) x (1, 0, 0) in component "04_Right_Shoulder_Standoff"
  line L0 (0, 0) -> (20, 0) construction
  circle A0 centre (20, 0) radius 44
  dimension "d296" = 20
  dimension "d297" = 44
extrude "Right_Yaw_Rotor_Packaging" add sketch "Yaw_Rotor_88mm_Envelope (2)" along normal blind 30 separate body makes body 22 in component "04_Right_Shoulder_Standoff"
ref_plane "WorkPlane1" through (0, 0, -60) normal (0, 0, 1) x (1, 0, 0) in component "04_Right_Yaw_Bearing_Housing"
sketch "Bearing_Housing_100mm_Envelope (2)" plane through (0, 0, -60) normal (0, 0, 1) x (1, 0, 0) in component "04_Right_Yaw_Bearing_Housing"
  circle A0 centre (0, 0) radius 45.5
  circle A1 centre (0, 0) radius 50
  dimension "d302" = 45.5
  dimension "d303" = 50
extrude "Right_Yaw_Bearing_Housing_Packaging" add sketch "Bearing_Housing_100mm_Envelope (2)" along normal blind 30 separate body makes body 23 in component "04_Right_Yaw_Bearing_Housing"
sketch "ASSUMED_Pillow_Envelope_Profile" plane through (0, 0, 0) normal (0, 1, 0) x (1, 0, 0) in component "10_ASSUMED_Pillow_300x400x60mm"
  line L0 (-150, 30) -> (150, 30)
  line L1 (150, 30) -> (150, -30)
  line L2 (150, -30) -> (-150, -30)
  line L3 (-150, -30) -> (-150, 30)
  dimension "d306" = 150
  dimension "d307" = 30
  dimension "d308" = 300
  dimension "d309" = 60
extrude "ASSUMED_Pillow_Envelope" add sketch "ASSUMED_Pillow_Envelope_Profile" along normal mid plane 400 separate body makes body 24 in component "10_ASSUMED_Pillow_300x400x60mm"
sketch "ASSUMED_Box_Envelope_Profile" plane through (0, 0, 0) normal (0, 1, 0) x (1, 0, 0) in component "10_ASSUMED_Box_100x60x80mm"
  line L0 (-50, 40) -> (50, 40)
  line L1 (50, 40) -> (50, -40)
  line L2 (50, -40) -> (-50, -40)
  line L3 (-50, -40) -> (-50, 40)
  dimension "d312" = 50
  dimension "d313" = 40
  dimension "d314" = 100
  dimension "d315" = 80
extrude "ASSUMED_Box_Envelope" add sketch "ASSUMED_Box_Envelope_Profile" along normal mid plane 60 separate body makes body 25 in component "10_ASSUMED_Box_100x60x80mm"
sketch "ASSUMED_Bottle_Section" plane through (0, 0, 0) normal (0, 0, 1) x (1, 0, 0) in component "10_ASSUMED_Bottle_D60x220mm"
  circle A0 centre (0, 0) radius 30
  dimension "d318" = 30
extrude "ASSUMED_Bottle_Envelope" add sketch "ASSUMED_Bottle_Section" along normal blind 220 separate body makes body 26 in component "10_ASSUMED_Bottle_D60x220mm"
sketch "ASSUMED_Shelf_Surface_1676p4mm_Profile" plane through (0, 0, 0) normal (0, 1, 0) x (1, 0, 0) in component "10_ASSUMED_Shelf_400x1000x25mm"
  line L0 (-200, 12.5) -> (200, 12.5)
  line L1 (200, 12.5) -> (200, -12.5)
  line L2 (200, -12.5) -> (-200, -12.5)
  line L3 (-200, -12.5) -> (-200, 12.5)
  dimension "d321" = 200
  dimension "d322" = 12.5
  dimension "d323" = 400
  dimension "d324" = 25
extrude "ASSUMED_Shelf_Surface_1676p4mm" add sketch "ASSUMED_Shelf_Surface_1676p4mm_Profile" along normal mid plane 1000 separate body makes body 27 in component "10_ASSUMED_Shelf_400x1000x25mm"
component "00_Layout" placed x (1, 0, 0) y (0, 1, 0) z (0, 0, 1) at (0, 0, 0)
component "01_Base_Envelope" placed x (1, 0, 0) y (0, 1, 0) z (0, 0, 1) at (0, 0, 0)
component "02_Mast_Envelope" placed x (1, 0, 0) y (0, 1, 0) z (0, 0, 1) at (0, 0, 0)
component "03_Shared_Carriage" placed x (1, 0, 0) y (0, 1, 0) z (0, 0, 1) at (0, 0, 0)
component "04_Left_Shoulder_Standoff" placed x (1, 0, 0) y (0, 1, 0) z (0, 0, 1) at (0, 0, 0)
component "05_Left_Upper_Arm" placed x (1, 0, 0) y (0, 1, 0) z (0, 0, 1) at (0, 0, 0)
component "06_Left_Forearm" placed x (1, 0, 0) y (0, 1, 0) z (0, 0, 1) at (0, 0, 0)
component "07_Left_Wrist_Palm" placed x (1, 0, 0) y (0, 1, 0) z (0, 0, 1) at (0, 0, 0)
component "08_Left_Finger_Positive" placed x (1, 0, 0) y (0, 1, 0) z (0, 0, 1) at (0, 0, 0)
component "09_Left_Pad_Positive" placed x (1, 0, 0) y (0, 1, 0) z (0, 0, 1) at (0, 0, 0)
component "08_Left_Finger_Negative" placed x (1, 0, 0) y (0, 1, 0) z (0, 0, 1) at (0, 0, 0)
component "09_Left_Pad_Negative" placed x (1, 0, 0) y (0, 1, 0) z (0, 0, 1) at (0, 0, 0)
component "04_Right_Shoulder_Standoff" placed x (1, 0, 0) y (0, 1, 0) z (0, 0, 1) at (0, 0, 0)
component "05_Right_Upper_Arm" placed x (1, 0, 0) y (0, 1, 0) z (0, 0, 1) at (0, 0, 0)
component "06_Right_Forearm" placed x (1, 0, 0) y (0, 1, 0) z (0, 0, 1) at (0, 0, 0)
component "07_Right_Wrist_Palm" placed x (1, 0, 0) y (0, 1, 0) z (0, 0, 1) at (0, 0, 0)
component "08_Right_Finger_Positive" placed x (1, 0, 0) y (0, 1, 0) z (0, 0, 1) at (0, 0, 0)
component "09_Right_Pad_Positive" placed x (1, 0, 0) y (0, 1, 0) z (0, 0, 1) at (0, 0, 0)
component "08_Right_Finger_Negative" placed x (1, 0, 0) y (0, 1, 0) z (0, 0, 1) at (0, 0, 0)
component "09_Right_Pad_Negative" placed x (1, 0, 0) y (0, 1, 0) z (0, 0, 1) at (0, 0, 0)
component "04_Left_Yaw_Bearing_Housing" placed x (1, 0, 0) y (0, 1, 0) z (0, 0, 1) at (0, 0, 0)
component "04_Right_Yaw_Bearing_Housing" placed x (1, 0, 0) y (0, 1, 0) z (0, 0, 1) at (0, 0, 0)
component "10_ASSUMED_Pillow_300x400x60mm" placed x (1, 0, 0) y (0, 1, 0) z (0, 0, 1) at (0, 0, 0)
component "10_ASSUMED_Box_100x60x80mm" placed x (1, 0, 0) y (0, 1, 0) z (0, 0, 1) at (0, 0, 0)
component "10_ASSUMED_Bottle_D60x220mm" placed x (1, 0, 0) y (0, 1, 0) z (0, 0, 1) at (0, 0, 0)
component "10_ASSUMED_Shelf_400x1000x25mm" placed x (1, 0, 0) y (0, 1, 0) z (0, 0, 1) at (0, 0, 0)
